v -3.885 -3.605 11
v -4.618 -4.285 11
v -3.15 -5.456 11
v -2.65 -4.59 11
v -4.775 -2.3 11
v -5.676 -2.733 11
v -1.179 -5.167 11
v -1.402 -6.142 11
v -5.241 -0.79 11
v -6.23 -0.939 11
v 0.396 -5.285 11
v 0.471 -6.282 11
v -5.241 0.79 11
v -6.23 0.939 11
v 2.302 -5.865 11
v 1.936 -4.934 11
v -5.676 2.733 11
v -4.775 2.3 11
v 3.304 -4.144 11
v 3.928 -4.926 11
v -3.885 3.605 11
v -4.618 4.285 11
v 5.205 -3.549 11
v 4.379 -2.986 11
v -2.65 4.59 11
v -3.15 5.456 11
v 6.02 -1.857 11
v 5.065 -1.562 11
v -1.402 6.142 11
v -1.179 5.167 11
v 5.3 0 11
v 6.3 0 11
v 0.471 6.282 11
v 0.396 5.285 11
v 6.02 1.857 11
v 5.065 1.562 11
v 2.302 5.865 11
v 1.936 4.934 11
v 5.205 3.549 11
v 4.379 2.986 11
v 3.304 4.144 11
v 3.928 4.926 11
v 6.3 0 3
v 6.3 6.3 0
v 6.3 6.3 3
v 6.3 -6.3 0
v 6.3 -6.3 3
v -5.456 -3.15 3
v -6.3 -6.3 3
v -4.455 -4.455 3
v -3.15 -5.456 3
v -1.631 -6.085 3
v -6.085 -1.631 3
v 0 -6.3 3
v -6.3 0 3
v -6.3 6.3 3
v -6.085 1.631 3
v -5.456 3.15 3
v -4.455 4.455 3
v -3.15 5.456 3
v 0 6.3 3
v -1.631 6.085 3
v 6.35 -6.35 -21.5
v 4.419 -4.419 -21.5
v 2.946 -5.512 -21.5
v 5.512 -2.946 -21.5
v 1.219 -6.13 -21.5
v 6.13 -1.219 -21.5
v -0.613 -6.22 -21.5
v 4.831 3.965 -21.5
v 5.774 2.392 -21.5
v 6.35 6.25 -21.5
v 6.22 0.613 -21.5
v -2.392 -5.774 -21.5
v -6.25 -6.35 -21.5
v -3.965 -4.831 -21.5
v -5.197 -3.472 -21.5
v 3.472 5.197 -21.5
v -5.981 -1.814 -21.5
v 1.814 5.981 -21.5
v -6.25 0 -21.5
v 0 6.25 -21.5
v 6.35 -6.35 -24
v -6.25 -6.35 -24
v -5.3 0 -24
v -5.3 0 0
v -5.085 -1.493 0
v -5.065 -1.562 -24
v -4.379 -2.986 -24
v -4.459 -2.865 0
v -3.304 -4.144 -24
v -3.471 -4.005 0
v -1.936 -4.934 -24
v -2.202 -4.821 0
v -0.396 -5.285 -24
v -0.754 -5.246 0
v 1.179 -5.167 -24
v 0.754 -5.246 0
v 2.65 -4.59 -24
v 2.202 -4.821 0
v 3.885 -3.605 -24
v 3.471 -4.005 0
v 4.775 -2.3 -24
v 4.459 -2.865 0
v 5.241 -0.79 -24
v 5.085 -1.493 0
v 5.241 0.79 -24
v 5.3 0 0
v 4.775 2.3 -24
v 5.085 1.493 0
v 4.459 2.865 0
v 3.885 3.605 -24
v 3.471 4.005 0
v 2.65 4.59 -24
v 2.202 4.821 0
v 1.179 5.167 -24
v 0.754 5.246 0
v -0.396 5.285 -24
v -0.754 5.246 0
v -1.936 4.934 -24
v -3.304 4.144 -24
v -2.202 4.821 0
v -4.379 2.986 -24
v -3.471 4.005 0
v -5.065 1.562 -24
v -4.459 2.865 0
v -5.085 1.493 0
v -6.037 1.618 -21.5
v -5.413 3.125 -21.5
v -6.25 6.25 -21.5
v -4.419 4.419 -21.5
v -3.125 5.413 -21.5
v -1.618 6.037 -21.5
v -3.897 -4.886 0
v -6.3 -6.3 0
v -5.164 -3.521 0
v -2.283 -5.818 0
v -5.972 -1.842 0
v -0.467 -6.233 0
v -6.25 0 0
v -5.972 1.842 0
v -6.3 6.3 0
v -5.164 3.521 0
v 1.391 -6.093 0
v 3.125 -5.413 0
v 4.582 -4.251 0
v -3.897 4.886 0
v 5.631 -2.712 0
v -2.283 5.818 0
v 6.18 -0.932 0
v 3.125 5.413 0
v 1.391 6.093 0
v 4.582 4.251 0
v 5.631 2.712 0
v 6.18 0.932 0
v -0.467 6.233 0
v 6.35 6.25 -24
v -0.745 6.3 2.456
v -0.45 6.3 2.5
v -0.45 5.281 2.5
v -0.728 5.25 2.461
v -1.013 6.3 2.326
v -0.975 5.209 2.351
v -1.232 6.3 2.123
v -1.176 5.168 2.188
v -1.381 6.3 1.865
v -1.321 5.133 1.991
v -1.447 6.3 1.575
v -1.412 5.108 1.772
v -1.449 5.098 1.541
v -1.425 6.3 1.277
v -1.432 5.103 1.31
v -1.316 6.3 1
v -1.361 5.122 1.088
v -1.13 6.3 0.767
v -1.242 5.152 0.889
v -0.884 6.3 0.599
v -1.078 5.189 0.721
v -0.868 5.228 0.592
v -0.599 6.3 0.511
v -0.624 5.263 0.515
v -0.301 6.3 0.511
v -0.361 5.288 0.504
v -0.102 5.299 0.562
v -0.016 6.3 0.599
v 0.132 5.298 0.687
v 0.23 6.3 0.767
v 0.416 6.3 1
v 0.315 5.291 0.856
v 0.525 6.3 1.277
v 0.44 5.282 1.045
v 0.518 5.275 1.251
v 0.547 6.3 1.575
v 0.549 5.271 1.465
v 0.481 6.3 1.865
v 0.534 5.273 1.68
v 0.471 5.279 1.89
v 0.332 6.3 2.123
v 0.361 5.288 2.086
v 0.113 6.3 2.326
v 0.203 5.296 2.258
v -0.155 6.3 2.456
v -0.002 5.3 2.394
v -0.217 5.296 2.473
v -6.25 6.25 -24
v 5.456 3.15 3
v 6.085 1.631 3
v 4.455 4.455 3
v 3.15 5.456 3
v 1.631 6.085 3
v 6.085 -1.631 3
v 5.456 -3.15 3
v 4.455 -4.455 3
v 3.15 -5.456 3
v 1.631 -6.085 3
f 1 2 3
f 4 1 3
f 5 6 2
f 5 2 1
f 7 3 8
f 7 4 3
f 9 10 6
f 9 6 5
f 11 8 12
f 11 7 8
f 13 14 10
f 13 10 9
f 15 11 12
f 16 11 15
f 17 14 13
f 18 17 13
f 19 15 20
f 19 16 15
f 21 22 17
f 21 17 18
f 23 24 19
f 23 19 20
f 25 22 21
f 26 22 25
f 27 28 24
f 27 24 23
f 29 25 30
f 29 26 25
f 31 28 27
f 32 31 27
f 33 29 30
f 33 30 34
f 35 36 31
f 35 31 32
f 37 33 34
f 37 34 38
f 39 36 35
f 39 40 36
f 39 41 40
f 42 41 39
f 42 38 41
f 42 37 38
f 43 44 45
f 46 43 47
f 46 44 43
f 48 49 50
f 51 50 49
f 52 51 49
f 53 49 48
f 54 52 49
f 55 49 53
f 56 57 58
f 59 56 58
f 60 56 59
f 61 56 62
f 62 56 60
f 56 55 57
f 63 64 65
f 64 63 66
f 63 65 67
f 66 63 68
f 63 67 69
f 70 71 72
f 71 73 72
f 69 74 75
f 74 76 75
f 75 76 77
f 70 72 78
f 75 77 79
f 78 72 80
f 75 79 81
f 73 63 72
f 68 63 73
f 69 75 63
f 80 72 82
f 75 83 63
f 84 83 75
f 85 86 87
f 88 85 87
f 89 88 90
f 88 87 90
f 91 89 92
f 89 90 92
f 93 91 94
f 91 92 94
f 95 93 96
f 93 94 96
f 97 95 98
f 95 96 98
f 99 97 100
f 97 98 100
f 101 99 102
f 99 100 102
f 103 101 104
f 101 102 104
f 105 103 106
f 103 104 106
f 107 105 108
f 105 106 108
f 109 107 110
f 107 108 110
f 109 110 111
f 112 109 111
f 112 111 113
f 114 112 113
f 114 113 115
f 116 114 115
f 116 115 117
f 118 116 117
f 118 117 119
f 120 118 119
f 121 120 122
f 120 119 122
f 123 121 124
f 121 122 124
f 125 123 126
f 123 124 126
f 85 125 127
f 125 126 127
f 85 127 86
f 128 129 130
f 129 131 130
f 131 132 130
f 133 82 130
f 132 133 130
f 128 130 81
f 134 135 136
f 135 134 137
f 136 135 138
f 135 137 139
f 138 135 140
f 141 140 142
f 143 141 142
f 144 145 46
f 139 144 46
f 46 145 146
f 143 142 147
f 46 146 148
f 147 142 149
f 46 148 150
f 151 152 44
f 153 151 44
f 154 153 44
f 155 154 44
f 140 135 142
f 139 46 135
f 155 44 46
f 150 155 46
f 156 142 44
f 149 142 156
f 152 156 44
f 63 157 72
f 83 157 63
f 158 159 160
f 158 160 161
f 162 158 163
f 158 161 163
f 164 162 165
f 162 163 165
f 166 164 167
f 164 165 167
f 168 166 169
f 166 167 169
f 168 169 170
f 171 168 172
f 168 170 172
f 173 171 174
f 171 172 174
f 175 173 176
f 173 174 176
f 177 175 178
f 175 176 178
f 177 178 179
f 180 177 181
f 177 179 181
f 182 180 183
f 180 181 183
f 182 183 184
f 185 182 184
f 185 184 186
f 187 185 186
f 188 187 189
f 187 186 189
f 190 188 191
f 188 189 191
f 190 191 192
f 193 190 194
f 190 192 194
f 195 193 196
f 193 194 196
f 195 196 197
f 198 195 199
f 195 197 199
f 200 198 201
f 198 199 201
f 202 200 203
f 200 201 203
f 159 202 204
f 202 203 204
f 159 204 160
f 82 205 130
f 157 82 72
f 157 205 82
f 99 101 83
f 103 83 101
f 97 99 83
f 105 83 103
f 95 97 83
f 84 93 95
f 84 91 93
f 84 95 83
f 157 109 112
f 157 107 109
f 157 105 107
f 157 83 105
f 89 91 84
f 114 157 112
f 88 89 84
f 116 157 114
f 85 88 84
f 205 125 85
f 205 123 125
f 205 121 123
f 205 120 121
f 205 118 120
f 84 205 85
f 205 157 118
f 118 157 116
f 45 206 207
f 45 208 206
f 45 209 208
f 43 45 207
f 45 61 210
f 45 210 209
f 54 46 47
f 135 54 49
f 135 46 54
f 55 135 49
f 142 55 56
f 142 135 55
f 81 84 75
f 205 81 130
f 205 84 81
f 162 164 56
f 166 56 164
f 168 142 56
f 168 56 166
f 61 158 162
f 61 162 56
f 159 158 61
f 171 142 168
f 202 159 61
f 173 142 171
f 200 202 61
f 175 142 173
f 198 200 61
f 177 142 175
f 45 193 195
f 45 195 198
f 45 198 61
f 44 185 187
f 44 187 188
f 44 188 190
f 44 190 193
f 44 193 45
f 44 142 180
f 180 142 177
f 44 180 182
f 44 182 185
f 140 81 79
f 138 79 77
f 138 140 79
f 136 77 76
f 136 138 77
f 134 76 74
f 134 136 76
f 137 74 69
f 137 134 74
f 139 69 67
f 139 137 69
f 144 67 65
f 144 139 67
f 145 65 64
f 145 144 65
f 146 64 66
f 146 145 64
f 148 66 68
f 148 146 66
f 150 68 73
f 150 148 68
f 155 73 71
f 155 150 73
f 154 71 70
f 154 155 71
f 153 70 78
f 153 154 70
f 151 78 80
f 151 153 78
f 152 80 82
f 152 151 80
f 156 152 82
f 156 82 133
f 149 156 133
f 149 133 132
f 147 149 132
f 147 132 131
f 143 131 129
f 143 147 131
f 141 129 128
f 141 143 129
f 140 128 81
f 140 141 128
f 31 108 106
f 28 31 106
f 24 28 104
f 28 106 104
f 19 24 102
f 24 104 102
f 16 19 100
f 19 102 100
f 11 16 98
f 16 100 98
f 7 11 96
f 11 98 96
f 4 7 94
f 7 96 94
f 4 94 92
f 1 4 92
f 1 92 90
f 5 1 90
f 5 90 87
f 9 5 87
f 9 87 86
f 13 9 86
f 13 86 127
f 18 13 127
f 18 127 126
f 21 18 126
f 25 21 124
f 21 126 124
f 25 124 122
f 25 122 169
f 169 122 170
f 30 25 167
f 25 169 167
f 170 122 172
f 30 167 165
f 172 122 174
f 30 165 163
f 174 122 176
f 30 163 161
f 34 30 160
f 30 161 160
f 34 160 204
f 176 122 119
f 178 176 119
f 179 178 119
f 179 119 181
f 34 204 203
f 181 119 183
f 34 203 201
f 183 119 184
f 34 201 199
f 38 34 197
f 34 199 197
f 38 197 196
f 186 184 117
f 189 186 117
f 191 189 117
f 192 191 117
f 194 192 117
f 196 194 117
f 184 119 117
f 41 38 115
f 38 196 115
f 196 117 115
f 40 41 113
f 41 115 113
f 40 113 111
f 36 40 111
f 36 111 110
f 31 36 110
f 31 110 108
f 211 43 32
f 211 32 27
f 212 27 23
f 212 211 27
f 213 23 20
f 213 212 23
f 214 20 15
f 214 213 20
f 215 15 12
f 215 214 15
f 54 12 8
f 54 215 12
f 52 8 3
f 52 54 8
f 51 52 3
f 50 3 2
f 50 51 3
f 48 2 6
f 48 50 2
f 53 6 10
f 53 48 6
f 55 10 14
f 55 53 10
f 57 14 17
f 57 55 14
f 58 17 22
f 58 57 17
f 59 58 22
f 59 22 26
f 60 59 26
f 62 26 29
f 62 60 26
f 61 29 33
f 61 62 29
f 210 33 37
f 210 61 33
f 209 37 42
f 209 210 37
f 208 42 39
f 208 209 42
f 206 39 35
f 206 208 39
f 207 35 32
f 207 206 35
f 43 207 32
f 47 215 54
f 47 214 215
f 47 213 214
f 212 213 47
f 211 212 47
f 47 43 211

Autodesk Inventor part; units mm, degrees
ref_plane "YZ Plane" through (0, 0, 0) normal (1, 0, 0) x (0, 1, 0)
ref_plane "XZ Plane" through (0, 0, 0) normal (0, 1, 0) x (-1, 0, 0)
ref_plane "XY Plane" through (0, 0, 0) normal (0, 0, 1) x (1, 0, 0)
sketch "Skizze1" plane through (0, 0, 0) normal (0, 0, 1) x (1, 0, 0)
  line L0 (-6.3, 6.3) -> (6.3, 6.3)
  line L1 (6.3, 6.3) -> (6.3, -6.3)
  line L2 (6.3, -6.3) -> (-6.3, -6.3)
  line L3 (-6.3, -6.3) -> (-6.3, 6.3)
  circle A0 centre (0, 0) radius 6.3
  circle A1 centre (0, 0) radius 5.3
  circle A2 centre (0, 0) radius 5.3
  circle A3 centre (0, 0) radius 6.3
  point P0 (0, -6.3)
  point P1 (-6.3, 0)
  dimension "d0" = 12.6
  dimension "d1" = 12.6
  dimension "d23" = 10.6
extrude "Extrusion2" add sketch "Skizze1" along normal blind 3
sketch "Skizze2" plane through (0, 0, 3) normal (0, 0, 1) x (1, 0, 0)
  circle A0 centre (0, 0) radius 5.3 projected
  circle A1 centre (0, 0) radius 6.3
  dimension "d7" = 12.6
extrude "Extrusion3" add sketch "Skizze2" along normal blind 8
sketch "Skizze3" plane through (0, 0, 0) normal (0, 0, -1) x (-1, 0, 0)
  circle A0 centre (0, 0) radius 5.3 projected
  circle A1 centre (0, 0) radius 5.3
  circle A2 centre (0, 0) radius 6.25
  dimension "d10" = 12.5
extrude "Extrusion4" add sketch "Skizze3" along normal blind 24
sketch "Skizze4" plane through (0, 0, -24) normal (0, 0, -1) x (-1, 0, 0)
  circle A0 centre (0, 0) radius 6.25 projected
  circle A1 centre (0, 0) radius 5.3 projected
  line L0 (-6.35, -6.35) -> (6.25, -6.35)
  line L1 (6.25, -6.35) -> (6.25, 6.25)
  line L2 (6.25, 6.25) -> (-6.35, 6.25)
  line L3 (-6.35, 6.25) -> (-6.35, -6.35)
  dimension "d25" = 10.6
  dimension "d26" = 12.5
  dimension "d29" = 12.6
  dimension "d30" = 12.6
sketch "Skizze5" plane through (6.3, 6.3, 3) normal (0, 1, 0) x (1, 0, 0)
  point P0 (-6.75, 1.5)
hole "Hole1" at (-0.45, 6.3, 1.5) direction (0, -1, 0) diameter 2 depth 8 tip angle 118
extrude "Extrusion6" add sketch "Skizze4" against normal blind 2.5 contours L1 L0 L3 L2 A0 | A0 L2 L1
properties part number "Sicherungshalter"
